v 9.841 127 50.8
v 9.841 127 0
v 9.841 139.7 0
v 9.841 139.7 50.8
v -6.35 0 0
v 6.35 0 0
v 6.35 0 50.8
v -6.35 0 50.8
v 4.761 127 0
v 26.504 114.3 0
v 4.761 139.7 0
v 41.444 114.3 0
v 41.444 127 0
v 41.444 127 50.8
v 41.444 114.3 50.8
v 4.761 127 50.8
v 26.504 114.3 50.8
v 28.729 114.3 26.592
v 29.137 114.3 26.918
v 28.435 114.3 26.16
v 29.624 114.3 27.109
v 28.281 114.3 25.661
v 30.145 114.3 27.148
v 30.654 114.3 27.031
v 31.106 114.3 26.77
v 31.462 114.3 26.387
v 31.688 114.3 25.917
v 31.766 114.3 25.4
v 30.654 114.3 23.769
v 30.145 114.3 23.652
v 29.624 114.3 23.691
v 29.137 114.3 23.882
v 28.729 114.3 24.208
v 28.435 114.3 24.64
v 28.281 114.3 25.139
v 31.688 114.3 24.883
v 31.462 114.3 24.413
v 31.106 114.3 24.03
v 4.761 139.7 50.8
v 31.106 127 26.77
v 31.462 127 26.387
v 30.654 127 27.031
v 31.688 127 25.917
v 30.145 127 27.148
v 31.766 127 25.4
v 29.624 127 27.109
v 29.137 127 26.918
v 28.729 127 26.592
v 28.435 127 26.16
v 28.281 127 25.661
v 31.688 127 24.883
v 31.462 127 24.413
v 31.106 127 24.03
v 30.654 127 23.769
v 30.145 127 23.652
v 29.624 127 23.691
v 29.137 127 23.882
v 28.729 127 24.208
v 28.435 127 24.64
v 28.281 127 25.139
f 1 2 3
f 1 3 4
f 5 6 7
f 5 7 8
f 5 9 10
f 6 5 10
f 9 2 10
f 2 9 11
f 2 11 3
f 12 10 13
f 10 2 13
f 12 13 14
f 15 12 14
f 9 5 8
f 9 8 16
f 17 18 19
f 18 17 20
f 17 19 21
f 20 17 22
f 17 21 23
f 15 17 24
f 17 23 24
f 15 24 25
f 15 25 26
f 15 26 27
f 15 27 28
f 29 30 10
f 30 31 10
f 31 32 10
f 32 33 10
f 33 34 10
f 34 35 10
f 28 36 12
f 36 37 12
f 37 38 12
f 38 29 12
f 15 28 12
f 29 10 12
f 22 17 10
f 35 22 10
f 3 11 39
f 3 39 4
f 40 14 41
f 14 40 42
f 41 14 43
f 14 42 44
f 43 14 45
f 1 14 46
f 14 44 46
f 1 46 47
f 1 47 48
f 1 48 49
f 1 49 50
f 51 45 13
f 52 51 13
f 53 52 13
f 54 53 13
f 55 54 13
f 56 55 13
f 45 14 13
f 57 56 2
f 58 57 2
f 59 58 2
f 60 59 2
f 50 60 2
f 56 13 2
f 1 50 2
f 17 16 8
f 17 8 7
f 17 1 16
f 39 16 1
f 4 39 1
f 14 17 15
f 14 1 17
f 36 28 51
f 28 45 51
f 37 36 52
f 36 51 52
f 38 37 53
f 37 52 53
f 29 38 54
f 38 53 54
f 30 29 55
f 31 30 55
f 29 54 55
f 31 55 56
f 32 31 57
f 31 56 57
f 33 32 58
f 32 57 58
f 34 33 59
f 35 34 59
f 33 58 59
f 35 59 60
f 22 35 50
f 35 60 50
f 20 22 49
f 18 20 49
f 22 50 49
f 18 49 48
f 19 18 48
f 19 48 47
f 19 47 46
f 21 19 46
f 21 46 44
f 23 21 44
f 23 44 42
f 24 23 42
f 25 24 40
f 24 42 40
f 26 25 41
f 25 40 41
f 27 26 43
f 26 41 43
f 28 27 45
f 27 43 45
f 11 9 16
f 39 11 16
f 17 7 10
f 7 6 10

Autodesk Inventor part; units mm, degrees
ref_plane "YZ Plane" through (0, 0, 0) normal (1, 0, 0) x (0, 1, 0)
ref_plane "XZ Plane" through (0, 0, 0) normal (0, 1, 0) x (-1, 0, 0)
ref_plane "XY Plane" through (0, 0, 0) normal (0, 0, 1) x (1, 0, 0)
sketch "Sketch1" plane through (0, 0, 0) normal (0, 0, 1) x (1, 0, 0)
  line L0 (0, 0) -> (-6.35, 0)
  line L1 (-6.35, 0) -> (4.7611, 127)
  line L2 (0, 0) -> (6.35, 0)
  line L3 (6.35, 0) -> (82.55, 0) construction
  line L4 (6.35, 0) -> (28.7435, 127)
  line L5 (6.35, 0) -> (135.3092, 0) construction
  line L6 (28.7435, 127) -> (4.7611, 127)
  dimension "d0" = 6.35
  dimension "d2" = 85
  dimension "d3" = 6.35
  dimension "d6" = 80
  dimension "d9" = 127
extrude "Extrusion1" add sketch "Sketch1" along normal blind 50.8
sketch "Sketch2" plane through (4.7611, 127, 0) normal (0, 1, 0) x (1, 0, 0)
  line L0 (0, 0) -> (-11.1111, 0) projected
  line L1 (0, 0) -> (5.08, 0)
  line L2 (23.9825, 0) -> (0, 0) projected
  line L3 (5.08, 0) -> (5.08, -50.8)
  line L4 (23.9825, -50.8) -> (0, -50.8) projected
  line L5 (0, 0) -> (0, -50.8) projected
  line L6 (0, -50.8) -> (0, 0)
  point P0 (-4.7611, 0)
  dimension "d10" = 5.08
extrude "Extrusion2" add sketch "Sketch2" along normal blind 12.7
sketch "Sketch4" plane through (28.7435, 127, 50.8) normal (0, 1, 0) x (1, 0, 0)
  line L0 (0, 50.8) -> (-18.9025, 50.8) projected
  line L1 (0, 50.8) -> (12.7, 50.8)
  line L2 (12.7, 50.8) -> (12.7, 0)
  line L3 (0, 50.8) -> (0, 0) projected
  line L4 (12.7, 0) -> (0, 0)
  line L5 (-18.9025, 0) -> (-18.9025, 50.8) projected
  line L6 (0, 0) -> (-18.9025, 0)
  line L7 (-18.9025, 0) -> (-18.9025, 50.8)
  line L8 (-18.9025, 50.8) -> (0, 50.8)
  point P0 (-28.7435, 50.8)
  dimension "d14" = 12.7
extrude "Extrusion3" add sketch "Sketch4" against normal blind 12.7
sketch "Sketch5" plane through (9.8411, 127, 50.8) normal (0, 1, 0) x (1, 0, 0)
  line L0 (31.6025, 0) -> (31.6025, 50.8) projected
  line L1 (16.6631, 50.8) -> (16.6631, 0) projected
  circle A0 centre (20.1725, 25.4) radius 1.7526
  line L2 (31.6025, 50.8) -> (0, 50.8) projected
  point P0 (-9.8411, 50.8)
  dimension "d18" = 3.5052
  dimension "d19" = 11.43
  dimension "d20" = 25.4
extrude "Extrusion4" cut sketch "Sketch5" against normal blind 12.7
thread "Thread1" size "6-32 UNC" class "2B" standard "ANSI Unified Screw Threads" full length
properties part number "Leg-01" material "Aluminum 6061"
